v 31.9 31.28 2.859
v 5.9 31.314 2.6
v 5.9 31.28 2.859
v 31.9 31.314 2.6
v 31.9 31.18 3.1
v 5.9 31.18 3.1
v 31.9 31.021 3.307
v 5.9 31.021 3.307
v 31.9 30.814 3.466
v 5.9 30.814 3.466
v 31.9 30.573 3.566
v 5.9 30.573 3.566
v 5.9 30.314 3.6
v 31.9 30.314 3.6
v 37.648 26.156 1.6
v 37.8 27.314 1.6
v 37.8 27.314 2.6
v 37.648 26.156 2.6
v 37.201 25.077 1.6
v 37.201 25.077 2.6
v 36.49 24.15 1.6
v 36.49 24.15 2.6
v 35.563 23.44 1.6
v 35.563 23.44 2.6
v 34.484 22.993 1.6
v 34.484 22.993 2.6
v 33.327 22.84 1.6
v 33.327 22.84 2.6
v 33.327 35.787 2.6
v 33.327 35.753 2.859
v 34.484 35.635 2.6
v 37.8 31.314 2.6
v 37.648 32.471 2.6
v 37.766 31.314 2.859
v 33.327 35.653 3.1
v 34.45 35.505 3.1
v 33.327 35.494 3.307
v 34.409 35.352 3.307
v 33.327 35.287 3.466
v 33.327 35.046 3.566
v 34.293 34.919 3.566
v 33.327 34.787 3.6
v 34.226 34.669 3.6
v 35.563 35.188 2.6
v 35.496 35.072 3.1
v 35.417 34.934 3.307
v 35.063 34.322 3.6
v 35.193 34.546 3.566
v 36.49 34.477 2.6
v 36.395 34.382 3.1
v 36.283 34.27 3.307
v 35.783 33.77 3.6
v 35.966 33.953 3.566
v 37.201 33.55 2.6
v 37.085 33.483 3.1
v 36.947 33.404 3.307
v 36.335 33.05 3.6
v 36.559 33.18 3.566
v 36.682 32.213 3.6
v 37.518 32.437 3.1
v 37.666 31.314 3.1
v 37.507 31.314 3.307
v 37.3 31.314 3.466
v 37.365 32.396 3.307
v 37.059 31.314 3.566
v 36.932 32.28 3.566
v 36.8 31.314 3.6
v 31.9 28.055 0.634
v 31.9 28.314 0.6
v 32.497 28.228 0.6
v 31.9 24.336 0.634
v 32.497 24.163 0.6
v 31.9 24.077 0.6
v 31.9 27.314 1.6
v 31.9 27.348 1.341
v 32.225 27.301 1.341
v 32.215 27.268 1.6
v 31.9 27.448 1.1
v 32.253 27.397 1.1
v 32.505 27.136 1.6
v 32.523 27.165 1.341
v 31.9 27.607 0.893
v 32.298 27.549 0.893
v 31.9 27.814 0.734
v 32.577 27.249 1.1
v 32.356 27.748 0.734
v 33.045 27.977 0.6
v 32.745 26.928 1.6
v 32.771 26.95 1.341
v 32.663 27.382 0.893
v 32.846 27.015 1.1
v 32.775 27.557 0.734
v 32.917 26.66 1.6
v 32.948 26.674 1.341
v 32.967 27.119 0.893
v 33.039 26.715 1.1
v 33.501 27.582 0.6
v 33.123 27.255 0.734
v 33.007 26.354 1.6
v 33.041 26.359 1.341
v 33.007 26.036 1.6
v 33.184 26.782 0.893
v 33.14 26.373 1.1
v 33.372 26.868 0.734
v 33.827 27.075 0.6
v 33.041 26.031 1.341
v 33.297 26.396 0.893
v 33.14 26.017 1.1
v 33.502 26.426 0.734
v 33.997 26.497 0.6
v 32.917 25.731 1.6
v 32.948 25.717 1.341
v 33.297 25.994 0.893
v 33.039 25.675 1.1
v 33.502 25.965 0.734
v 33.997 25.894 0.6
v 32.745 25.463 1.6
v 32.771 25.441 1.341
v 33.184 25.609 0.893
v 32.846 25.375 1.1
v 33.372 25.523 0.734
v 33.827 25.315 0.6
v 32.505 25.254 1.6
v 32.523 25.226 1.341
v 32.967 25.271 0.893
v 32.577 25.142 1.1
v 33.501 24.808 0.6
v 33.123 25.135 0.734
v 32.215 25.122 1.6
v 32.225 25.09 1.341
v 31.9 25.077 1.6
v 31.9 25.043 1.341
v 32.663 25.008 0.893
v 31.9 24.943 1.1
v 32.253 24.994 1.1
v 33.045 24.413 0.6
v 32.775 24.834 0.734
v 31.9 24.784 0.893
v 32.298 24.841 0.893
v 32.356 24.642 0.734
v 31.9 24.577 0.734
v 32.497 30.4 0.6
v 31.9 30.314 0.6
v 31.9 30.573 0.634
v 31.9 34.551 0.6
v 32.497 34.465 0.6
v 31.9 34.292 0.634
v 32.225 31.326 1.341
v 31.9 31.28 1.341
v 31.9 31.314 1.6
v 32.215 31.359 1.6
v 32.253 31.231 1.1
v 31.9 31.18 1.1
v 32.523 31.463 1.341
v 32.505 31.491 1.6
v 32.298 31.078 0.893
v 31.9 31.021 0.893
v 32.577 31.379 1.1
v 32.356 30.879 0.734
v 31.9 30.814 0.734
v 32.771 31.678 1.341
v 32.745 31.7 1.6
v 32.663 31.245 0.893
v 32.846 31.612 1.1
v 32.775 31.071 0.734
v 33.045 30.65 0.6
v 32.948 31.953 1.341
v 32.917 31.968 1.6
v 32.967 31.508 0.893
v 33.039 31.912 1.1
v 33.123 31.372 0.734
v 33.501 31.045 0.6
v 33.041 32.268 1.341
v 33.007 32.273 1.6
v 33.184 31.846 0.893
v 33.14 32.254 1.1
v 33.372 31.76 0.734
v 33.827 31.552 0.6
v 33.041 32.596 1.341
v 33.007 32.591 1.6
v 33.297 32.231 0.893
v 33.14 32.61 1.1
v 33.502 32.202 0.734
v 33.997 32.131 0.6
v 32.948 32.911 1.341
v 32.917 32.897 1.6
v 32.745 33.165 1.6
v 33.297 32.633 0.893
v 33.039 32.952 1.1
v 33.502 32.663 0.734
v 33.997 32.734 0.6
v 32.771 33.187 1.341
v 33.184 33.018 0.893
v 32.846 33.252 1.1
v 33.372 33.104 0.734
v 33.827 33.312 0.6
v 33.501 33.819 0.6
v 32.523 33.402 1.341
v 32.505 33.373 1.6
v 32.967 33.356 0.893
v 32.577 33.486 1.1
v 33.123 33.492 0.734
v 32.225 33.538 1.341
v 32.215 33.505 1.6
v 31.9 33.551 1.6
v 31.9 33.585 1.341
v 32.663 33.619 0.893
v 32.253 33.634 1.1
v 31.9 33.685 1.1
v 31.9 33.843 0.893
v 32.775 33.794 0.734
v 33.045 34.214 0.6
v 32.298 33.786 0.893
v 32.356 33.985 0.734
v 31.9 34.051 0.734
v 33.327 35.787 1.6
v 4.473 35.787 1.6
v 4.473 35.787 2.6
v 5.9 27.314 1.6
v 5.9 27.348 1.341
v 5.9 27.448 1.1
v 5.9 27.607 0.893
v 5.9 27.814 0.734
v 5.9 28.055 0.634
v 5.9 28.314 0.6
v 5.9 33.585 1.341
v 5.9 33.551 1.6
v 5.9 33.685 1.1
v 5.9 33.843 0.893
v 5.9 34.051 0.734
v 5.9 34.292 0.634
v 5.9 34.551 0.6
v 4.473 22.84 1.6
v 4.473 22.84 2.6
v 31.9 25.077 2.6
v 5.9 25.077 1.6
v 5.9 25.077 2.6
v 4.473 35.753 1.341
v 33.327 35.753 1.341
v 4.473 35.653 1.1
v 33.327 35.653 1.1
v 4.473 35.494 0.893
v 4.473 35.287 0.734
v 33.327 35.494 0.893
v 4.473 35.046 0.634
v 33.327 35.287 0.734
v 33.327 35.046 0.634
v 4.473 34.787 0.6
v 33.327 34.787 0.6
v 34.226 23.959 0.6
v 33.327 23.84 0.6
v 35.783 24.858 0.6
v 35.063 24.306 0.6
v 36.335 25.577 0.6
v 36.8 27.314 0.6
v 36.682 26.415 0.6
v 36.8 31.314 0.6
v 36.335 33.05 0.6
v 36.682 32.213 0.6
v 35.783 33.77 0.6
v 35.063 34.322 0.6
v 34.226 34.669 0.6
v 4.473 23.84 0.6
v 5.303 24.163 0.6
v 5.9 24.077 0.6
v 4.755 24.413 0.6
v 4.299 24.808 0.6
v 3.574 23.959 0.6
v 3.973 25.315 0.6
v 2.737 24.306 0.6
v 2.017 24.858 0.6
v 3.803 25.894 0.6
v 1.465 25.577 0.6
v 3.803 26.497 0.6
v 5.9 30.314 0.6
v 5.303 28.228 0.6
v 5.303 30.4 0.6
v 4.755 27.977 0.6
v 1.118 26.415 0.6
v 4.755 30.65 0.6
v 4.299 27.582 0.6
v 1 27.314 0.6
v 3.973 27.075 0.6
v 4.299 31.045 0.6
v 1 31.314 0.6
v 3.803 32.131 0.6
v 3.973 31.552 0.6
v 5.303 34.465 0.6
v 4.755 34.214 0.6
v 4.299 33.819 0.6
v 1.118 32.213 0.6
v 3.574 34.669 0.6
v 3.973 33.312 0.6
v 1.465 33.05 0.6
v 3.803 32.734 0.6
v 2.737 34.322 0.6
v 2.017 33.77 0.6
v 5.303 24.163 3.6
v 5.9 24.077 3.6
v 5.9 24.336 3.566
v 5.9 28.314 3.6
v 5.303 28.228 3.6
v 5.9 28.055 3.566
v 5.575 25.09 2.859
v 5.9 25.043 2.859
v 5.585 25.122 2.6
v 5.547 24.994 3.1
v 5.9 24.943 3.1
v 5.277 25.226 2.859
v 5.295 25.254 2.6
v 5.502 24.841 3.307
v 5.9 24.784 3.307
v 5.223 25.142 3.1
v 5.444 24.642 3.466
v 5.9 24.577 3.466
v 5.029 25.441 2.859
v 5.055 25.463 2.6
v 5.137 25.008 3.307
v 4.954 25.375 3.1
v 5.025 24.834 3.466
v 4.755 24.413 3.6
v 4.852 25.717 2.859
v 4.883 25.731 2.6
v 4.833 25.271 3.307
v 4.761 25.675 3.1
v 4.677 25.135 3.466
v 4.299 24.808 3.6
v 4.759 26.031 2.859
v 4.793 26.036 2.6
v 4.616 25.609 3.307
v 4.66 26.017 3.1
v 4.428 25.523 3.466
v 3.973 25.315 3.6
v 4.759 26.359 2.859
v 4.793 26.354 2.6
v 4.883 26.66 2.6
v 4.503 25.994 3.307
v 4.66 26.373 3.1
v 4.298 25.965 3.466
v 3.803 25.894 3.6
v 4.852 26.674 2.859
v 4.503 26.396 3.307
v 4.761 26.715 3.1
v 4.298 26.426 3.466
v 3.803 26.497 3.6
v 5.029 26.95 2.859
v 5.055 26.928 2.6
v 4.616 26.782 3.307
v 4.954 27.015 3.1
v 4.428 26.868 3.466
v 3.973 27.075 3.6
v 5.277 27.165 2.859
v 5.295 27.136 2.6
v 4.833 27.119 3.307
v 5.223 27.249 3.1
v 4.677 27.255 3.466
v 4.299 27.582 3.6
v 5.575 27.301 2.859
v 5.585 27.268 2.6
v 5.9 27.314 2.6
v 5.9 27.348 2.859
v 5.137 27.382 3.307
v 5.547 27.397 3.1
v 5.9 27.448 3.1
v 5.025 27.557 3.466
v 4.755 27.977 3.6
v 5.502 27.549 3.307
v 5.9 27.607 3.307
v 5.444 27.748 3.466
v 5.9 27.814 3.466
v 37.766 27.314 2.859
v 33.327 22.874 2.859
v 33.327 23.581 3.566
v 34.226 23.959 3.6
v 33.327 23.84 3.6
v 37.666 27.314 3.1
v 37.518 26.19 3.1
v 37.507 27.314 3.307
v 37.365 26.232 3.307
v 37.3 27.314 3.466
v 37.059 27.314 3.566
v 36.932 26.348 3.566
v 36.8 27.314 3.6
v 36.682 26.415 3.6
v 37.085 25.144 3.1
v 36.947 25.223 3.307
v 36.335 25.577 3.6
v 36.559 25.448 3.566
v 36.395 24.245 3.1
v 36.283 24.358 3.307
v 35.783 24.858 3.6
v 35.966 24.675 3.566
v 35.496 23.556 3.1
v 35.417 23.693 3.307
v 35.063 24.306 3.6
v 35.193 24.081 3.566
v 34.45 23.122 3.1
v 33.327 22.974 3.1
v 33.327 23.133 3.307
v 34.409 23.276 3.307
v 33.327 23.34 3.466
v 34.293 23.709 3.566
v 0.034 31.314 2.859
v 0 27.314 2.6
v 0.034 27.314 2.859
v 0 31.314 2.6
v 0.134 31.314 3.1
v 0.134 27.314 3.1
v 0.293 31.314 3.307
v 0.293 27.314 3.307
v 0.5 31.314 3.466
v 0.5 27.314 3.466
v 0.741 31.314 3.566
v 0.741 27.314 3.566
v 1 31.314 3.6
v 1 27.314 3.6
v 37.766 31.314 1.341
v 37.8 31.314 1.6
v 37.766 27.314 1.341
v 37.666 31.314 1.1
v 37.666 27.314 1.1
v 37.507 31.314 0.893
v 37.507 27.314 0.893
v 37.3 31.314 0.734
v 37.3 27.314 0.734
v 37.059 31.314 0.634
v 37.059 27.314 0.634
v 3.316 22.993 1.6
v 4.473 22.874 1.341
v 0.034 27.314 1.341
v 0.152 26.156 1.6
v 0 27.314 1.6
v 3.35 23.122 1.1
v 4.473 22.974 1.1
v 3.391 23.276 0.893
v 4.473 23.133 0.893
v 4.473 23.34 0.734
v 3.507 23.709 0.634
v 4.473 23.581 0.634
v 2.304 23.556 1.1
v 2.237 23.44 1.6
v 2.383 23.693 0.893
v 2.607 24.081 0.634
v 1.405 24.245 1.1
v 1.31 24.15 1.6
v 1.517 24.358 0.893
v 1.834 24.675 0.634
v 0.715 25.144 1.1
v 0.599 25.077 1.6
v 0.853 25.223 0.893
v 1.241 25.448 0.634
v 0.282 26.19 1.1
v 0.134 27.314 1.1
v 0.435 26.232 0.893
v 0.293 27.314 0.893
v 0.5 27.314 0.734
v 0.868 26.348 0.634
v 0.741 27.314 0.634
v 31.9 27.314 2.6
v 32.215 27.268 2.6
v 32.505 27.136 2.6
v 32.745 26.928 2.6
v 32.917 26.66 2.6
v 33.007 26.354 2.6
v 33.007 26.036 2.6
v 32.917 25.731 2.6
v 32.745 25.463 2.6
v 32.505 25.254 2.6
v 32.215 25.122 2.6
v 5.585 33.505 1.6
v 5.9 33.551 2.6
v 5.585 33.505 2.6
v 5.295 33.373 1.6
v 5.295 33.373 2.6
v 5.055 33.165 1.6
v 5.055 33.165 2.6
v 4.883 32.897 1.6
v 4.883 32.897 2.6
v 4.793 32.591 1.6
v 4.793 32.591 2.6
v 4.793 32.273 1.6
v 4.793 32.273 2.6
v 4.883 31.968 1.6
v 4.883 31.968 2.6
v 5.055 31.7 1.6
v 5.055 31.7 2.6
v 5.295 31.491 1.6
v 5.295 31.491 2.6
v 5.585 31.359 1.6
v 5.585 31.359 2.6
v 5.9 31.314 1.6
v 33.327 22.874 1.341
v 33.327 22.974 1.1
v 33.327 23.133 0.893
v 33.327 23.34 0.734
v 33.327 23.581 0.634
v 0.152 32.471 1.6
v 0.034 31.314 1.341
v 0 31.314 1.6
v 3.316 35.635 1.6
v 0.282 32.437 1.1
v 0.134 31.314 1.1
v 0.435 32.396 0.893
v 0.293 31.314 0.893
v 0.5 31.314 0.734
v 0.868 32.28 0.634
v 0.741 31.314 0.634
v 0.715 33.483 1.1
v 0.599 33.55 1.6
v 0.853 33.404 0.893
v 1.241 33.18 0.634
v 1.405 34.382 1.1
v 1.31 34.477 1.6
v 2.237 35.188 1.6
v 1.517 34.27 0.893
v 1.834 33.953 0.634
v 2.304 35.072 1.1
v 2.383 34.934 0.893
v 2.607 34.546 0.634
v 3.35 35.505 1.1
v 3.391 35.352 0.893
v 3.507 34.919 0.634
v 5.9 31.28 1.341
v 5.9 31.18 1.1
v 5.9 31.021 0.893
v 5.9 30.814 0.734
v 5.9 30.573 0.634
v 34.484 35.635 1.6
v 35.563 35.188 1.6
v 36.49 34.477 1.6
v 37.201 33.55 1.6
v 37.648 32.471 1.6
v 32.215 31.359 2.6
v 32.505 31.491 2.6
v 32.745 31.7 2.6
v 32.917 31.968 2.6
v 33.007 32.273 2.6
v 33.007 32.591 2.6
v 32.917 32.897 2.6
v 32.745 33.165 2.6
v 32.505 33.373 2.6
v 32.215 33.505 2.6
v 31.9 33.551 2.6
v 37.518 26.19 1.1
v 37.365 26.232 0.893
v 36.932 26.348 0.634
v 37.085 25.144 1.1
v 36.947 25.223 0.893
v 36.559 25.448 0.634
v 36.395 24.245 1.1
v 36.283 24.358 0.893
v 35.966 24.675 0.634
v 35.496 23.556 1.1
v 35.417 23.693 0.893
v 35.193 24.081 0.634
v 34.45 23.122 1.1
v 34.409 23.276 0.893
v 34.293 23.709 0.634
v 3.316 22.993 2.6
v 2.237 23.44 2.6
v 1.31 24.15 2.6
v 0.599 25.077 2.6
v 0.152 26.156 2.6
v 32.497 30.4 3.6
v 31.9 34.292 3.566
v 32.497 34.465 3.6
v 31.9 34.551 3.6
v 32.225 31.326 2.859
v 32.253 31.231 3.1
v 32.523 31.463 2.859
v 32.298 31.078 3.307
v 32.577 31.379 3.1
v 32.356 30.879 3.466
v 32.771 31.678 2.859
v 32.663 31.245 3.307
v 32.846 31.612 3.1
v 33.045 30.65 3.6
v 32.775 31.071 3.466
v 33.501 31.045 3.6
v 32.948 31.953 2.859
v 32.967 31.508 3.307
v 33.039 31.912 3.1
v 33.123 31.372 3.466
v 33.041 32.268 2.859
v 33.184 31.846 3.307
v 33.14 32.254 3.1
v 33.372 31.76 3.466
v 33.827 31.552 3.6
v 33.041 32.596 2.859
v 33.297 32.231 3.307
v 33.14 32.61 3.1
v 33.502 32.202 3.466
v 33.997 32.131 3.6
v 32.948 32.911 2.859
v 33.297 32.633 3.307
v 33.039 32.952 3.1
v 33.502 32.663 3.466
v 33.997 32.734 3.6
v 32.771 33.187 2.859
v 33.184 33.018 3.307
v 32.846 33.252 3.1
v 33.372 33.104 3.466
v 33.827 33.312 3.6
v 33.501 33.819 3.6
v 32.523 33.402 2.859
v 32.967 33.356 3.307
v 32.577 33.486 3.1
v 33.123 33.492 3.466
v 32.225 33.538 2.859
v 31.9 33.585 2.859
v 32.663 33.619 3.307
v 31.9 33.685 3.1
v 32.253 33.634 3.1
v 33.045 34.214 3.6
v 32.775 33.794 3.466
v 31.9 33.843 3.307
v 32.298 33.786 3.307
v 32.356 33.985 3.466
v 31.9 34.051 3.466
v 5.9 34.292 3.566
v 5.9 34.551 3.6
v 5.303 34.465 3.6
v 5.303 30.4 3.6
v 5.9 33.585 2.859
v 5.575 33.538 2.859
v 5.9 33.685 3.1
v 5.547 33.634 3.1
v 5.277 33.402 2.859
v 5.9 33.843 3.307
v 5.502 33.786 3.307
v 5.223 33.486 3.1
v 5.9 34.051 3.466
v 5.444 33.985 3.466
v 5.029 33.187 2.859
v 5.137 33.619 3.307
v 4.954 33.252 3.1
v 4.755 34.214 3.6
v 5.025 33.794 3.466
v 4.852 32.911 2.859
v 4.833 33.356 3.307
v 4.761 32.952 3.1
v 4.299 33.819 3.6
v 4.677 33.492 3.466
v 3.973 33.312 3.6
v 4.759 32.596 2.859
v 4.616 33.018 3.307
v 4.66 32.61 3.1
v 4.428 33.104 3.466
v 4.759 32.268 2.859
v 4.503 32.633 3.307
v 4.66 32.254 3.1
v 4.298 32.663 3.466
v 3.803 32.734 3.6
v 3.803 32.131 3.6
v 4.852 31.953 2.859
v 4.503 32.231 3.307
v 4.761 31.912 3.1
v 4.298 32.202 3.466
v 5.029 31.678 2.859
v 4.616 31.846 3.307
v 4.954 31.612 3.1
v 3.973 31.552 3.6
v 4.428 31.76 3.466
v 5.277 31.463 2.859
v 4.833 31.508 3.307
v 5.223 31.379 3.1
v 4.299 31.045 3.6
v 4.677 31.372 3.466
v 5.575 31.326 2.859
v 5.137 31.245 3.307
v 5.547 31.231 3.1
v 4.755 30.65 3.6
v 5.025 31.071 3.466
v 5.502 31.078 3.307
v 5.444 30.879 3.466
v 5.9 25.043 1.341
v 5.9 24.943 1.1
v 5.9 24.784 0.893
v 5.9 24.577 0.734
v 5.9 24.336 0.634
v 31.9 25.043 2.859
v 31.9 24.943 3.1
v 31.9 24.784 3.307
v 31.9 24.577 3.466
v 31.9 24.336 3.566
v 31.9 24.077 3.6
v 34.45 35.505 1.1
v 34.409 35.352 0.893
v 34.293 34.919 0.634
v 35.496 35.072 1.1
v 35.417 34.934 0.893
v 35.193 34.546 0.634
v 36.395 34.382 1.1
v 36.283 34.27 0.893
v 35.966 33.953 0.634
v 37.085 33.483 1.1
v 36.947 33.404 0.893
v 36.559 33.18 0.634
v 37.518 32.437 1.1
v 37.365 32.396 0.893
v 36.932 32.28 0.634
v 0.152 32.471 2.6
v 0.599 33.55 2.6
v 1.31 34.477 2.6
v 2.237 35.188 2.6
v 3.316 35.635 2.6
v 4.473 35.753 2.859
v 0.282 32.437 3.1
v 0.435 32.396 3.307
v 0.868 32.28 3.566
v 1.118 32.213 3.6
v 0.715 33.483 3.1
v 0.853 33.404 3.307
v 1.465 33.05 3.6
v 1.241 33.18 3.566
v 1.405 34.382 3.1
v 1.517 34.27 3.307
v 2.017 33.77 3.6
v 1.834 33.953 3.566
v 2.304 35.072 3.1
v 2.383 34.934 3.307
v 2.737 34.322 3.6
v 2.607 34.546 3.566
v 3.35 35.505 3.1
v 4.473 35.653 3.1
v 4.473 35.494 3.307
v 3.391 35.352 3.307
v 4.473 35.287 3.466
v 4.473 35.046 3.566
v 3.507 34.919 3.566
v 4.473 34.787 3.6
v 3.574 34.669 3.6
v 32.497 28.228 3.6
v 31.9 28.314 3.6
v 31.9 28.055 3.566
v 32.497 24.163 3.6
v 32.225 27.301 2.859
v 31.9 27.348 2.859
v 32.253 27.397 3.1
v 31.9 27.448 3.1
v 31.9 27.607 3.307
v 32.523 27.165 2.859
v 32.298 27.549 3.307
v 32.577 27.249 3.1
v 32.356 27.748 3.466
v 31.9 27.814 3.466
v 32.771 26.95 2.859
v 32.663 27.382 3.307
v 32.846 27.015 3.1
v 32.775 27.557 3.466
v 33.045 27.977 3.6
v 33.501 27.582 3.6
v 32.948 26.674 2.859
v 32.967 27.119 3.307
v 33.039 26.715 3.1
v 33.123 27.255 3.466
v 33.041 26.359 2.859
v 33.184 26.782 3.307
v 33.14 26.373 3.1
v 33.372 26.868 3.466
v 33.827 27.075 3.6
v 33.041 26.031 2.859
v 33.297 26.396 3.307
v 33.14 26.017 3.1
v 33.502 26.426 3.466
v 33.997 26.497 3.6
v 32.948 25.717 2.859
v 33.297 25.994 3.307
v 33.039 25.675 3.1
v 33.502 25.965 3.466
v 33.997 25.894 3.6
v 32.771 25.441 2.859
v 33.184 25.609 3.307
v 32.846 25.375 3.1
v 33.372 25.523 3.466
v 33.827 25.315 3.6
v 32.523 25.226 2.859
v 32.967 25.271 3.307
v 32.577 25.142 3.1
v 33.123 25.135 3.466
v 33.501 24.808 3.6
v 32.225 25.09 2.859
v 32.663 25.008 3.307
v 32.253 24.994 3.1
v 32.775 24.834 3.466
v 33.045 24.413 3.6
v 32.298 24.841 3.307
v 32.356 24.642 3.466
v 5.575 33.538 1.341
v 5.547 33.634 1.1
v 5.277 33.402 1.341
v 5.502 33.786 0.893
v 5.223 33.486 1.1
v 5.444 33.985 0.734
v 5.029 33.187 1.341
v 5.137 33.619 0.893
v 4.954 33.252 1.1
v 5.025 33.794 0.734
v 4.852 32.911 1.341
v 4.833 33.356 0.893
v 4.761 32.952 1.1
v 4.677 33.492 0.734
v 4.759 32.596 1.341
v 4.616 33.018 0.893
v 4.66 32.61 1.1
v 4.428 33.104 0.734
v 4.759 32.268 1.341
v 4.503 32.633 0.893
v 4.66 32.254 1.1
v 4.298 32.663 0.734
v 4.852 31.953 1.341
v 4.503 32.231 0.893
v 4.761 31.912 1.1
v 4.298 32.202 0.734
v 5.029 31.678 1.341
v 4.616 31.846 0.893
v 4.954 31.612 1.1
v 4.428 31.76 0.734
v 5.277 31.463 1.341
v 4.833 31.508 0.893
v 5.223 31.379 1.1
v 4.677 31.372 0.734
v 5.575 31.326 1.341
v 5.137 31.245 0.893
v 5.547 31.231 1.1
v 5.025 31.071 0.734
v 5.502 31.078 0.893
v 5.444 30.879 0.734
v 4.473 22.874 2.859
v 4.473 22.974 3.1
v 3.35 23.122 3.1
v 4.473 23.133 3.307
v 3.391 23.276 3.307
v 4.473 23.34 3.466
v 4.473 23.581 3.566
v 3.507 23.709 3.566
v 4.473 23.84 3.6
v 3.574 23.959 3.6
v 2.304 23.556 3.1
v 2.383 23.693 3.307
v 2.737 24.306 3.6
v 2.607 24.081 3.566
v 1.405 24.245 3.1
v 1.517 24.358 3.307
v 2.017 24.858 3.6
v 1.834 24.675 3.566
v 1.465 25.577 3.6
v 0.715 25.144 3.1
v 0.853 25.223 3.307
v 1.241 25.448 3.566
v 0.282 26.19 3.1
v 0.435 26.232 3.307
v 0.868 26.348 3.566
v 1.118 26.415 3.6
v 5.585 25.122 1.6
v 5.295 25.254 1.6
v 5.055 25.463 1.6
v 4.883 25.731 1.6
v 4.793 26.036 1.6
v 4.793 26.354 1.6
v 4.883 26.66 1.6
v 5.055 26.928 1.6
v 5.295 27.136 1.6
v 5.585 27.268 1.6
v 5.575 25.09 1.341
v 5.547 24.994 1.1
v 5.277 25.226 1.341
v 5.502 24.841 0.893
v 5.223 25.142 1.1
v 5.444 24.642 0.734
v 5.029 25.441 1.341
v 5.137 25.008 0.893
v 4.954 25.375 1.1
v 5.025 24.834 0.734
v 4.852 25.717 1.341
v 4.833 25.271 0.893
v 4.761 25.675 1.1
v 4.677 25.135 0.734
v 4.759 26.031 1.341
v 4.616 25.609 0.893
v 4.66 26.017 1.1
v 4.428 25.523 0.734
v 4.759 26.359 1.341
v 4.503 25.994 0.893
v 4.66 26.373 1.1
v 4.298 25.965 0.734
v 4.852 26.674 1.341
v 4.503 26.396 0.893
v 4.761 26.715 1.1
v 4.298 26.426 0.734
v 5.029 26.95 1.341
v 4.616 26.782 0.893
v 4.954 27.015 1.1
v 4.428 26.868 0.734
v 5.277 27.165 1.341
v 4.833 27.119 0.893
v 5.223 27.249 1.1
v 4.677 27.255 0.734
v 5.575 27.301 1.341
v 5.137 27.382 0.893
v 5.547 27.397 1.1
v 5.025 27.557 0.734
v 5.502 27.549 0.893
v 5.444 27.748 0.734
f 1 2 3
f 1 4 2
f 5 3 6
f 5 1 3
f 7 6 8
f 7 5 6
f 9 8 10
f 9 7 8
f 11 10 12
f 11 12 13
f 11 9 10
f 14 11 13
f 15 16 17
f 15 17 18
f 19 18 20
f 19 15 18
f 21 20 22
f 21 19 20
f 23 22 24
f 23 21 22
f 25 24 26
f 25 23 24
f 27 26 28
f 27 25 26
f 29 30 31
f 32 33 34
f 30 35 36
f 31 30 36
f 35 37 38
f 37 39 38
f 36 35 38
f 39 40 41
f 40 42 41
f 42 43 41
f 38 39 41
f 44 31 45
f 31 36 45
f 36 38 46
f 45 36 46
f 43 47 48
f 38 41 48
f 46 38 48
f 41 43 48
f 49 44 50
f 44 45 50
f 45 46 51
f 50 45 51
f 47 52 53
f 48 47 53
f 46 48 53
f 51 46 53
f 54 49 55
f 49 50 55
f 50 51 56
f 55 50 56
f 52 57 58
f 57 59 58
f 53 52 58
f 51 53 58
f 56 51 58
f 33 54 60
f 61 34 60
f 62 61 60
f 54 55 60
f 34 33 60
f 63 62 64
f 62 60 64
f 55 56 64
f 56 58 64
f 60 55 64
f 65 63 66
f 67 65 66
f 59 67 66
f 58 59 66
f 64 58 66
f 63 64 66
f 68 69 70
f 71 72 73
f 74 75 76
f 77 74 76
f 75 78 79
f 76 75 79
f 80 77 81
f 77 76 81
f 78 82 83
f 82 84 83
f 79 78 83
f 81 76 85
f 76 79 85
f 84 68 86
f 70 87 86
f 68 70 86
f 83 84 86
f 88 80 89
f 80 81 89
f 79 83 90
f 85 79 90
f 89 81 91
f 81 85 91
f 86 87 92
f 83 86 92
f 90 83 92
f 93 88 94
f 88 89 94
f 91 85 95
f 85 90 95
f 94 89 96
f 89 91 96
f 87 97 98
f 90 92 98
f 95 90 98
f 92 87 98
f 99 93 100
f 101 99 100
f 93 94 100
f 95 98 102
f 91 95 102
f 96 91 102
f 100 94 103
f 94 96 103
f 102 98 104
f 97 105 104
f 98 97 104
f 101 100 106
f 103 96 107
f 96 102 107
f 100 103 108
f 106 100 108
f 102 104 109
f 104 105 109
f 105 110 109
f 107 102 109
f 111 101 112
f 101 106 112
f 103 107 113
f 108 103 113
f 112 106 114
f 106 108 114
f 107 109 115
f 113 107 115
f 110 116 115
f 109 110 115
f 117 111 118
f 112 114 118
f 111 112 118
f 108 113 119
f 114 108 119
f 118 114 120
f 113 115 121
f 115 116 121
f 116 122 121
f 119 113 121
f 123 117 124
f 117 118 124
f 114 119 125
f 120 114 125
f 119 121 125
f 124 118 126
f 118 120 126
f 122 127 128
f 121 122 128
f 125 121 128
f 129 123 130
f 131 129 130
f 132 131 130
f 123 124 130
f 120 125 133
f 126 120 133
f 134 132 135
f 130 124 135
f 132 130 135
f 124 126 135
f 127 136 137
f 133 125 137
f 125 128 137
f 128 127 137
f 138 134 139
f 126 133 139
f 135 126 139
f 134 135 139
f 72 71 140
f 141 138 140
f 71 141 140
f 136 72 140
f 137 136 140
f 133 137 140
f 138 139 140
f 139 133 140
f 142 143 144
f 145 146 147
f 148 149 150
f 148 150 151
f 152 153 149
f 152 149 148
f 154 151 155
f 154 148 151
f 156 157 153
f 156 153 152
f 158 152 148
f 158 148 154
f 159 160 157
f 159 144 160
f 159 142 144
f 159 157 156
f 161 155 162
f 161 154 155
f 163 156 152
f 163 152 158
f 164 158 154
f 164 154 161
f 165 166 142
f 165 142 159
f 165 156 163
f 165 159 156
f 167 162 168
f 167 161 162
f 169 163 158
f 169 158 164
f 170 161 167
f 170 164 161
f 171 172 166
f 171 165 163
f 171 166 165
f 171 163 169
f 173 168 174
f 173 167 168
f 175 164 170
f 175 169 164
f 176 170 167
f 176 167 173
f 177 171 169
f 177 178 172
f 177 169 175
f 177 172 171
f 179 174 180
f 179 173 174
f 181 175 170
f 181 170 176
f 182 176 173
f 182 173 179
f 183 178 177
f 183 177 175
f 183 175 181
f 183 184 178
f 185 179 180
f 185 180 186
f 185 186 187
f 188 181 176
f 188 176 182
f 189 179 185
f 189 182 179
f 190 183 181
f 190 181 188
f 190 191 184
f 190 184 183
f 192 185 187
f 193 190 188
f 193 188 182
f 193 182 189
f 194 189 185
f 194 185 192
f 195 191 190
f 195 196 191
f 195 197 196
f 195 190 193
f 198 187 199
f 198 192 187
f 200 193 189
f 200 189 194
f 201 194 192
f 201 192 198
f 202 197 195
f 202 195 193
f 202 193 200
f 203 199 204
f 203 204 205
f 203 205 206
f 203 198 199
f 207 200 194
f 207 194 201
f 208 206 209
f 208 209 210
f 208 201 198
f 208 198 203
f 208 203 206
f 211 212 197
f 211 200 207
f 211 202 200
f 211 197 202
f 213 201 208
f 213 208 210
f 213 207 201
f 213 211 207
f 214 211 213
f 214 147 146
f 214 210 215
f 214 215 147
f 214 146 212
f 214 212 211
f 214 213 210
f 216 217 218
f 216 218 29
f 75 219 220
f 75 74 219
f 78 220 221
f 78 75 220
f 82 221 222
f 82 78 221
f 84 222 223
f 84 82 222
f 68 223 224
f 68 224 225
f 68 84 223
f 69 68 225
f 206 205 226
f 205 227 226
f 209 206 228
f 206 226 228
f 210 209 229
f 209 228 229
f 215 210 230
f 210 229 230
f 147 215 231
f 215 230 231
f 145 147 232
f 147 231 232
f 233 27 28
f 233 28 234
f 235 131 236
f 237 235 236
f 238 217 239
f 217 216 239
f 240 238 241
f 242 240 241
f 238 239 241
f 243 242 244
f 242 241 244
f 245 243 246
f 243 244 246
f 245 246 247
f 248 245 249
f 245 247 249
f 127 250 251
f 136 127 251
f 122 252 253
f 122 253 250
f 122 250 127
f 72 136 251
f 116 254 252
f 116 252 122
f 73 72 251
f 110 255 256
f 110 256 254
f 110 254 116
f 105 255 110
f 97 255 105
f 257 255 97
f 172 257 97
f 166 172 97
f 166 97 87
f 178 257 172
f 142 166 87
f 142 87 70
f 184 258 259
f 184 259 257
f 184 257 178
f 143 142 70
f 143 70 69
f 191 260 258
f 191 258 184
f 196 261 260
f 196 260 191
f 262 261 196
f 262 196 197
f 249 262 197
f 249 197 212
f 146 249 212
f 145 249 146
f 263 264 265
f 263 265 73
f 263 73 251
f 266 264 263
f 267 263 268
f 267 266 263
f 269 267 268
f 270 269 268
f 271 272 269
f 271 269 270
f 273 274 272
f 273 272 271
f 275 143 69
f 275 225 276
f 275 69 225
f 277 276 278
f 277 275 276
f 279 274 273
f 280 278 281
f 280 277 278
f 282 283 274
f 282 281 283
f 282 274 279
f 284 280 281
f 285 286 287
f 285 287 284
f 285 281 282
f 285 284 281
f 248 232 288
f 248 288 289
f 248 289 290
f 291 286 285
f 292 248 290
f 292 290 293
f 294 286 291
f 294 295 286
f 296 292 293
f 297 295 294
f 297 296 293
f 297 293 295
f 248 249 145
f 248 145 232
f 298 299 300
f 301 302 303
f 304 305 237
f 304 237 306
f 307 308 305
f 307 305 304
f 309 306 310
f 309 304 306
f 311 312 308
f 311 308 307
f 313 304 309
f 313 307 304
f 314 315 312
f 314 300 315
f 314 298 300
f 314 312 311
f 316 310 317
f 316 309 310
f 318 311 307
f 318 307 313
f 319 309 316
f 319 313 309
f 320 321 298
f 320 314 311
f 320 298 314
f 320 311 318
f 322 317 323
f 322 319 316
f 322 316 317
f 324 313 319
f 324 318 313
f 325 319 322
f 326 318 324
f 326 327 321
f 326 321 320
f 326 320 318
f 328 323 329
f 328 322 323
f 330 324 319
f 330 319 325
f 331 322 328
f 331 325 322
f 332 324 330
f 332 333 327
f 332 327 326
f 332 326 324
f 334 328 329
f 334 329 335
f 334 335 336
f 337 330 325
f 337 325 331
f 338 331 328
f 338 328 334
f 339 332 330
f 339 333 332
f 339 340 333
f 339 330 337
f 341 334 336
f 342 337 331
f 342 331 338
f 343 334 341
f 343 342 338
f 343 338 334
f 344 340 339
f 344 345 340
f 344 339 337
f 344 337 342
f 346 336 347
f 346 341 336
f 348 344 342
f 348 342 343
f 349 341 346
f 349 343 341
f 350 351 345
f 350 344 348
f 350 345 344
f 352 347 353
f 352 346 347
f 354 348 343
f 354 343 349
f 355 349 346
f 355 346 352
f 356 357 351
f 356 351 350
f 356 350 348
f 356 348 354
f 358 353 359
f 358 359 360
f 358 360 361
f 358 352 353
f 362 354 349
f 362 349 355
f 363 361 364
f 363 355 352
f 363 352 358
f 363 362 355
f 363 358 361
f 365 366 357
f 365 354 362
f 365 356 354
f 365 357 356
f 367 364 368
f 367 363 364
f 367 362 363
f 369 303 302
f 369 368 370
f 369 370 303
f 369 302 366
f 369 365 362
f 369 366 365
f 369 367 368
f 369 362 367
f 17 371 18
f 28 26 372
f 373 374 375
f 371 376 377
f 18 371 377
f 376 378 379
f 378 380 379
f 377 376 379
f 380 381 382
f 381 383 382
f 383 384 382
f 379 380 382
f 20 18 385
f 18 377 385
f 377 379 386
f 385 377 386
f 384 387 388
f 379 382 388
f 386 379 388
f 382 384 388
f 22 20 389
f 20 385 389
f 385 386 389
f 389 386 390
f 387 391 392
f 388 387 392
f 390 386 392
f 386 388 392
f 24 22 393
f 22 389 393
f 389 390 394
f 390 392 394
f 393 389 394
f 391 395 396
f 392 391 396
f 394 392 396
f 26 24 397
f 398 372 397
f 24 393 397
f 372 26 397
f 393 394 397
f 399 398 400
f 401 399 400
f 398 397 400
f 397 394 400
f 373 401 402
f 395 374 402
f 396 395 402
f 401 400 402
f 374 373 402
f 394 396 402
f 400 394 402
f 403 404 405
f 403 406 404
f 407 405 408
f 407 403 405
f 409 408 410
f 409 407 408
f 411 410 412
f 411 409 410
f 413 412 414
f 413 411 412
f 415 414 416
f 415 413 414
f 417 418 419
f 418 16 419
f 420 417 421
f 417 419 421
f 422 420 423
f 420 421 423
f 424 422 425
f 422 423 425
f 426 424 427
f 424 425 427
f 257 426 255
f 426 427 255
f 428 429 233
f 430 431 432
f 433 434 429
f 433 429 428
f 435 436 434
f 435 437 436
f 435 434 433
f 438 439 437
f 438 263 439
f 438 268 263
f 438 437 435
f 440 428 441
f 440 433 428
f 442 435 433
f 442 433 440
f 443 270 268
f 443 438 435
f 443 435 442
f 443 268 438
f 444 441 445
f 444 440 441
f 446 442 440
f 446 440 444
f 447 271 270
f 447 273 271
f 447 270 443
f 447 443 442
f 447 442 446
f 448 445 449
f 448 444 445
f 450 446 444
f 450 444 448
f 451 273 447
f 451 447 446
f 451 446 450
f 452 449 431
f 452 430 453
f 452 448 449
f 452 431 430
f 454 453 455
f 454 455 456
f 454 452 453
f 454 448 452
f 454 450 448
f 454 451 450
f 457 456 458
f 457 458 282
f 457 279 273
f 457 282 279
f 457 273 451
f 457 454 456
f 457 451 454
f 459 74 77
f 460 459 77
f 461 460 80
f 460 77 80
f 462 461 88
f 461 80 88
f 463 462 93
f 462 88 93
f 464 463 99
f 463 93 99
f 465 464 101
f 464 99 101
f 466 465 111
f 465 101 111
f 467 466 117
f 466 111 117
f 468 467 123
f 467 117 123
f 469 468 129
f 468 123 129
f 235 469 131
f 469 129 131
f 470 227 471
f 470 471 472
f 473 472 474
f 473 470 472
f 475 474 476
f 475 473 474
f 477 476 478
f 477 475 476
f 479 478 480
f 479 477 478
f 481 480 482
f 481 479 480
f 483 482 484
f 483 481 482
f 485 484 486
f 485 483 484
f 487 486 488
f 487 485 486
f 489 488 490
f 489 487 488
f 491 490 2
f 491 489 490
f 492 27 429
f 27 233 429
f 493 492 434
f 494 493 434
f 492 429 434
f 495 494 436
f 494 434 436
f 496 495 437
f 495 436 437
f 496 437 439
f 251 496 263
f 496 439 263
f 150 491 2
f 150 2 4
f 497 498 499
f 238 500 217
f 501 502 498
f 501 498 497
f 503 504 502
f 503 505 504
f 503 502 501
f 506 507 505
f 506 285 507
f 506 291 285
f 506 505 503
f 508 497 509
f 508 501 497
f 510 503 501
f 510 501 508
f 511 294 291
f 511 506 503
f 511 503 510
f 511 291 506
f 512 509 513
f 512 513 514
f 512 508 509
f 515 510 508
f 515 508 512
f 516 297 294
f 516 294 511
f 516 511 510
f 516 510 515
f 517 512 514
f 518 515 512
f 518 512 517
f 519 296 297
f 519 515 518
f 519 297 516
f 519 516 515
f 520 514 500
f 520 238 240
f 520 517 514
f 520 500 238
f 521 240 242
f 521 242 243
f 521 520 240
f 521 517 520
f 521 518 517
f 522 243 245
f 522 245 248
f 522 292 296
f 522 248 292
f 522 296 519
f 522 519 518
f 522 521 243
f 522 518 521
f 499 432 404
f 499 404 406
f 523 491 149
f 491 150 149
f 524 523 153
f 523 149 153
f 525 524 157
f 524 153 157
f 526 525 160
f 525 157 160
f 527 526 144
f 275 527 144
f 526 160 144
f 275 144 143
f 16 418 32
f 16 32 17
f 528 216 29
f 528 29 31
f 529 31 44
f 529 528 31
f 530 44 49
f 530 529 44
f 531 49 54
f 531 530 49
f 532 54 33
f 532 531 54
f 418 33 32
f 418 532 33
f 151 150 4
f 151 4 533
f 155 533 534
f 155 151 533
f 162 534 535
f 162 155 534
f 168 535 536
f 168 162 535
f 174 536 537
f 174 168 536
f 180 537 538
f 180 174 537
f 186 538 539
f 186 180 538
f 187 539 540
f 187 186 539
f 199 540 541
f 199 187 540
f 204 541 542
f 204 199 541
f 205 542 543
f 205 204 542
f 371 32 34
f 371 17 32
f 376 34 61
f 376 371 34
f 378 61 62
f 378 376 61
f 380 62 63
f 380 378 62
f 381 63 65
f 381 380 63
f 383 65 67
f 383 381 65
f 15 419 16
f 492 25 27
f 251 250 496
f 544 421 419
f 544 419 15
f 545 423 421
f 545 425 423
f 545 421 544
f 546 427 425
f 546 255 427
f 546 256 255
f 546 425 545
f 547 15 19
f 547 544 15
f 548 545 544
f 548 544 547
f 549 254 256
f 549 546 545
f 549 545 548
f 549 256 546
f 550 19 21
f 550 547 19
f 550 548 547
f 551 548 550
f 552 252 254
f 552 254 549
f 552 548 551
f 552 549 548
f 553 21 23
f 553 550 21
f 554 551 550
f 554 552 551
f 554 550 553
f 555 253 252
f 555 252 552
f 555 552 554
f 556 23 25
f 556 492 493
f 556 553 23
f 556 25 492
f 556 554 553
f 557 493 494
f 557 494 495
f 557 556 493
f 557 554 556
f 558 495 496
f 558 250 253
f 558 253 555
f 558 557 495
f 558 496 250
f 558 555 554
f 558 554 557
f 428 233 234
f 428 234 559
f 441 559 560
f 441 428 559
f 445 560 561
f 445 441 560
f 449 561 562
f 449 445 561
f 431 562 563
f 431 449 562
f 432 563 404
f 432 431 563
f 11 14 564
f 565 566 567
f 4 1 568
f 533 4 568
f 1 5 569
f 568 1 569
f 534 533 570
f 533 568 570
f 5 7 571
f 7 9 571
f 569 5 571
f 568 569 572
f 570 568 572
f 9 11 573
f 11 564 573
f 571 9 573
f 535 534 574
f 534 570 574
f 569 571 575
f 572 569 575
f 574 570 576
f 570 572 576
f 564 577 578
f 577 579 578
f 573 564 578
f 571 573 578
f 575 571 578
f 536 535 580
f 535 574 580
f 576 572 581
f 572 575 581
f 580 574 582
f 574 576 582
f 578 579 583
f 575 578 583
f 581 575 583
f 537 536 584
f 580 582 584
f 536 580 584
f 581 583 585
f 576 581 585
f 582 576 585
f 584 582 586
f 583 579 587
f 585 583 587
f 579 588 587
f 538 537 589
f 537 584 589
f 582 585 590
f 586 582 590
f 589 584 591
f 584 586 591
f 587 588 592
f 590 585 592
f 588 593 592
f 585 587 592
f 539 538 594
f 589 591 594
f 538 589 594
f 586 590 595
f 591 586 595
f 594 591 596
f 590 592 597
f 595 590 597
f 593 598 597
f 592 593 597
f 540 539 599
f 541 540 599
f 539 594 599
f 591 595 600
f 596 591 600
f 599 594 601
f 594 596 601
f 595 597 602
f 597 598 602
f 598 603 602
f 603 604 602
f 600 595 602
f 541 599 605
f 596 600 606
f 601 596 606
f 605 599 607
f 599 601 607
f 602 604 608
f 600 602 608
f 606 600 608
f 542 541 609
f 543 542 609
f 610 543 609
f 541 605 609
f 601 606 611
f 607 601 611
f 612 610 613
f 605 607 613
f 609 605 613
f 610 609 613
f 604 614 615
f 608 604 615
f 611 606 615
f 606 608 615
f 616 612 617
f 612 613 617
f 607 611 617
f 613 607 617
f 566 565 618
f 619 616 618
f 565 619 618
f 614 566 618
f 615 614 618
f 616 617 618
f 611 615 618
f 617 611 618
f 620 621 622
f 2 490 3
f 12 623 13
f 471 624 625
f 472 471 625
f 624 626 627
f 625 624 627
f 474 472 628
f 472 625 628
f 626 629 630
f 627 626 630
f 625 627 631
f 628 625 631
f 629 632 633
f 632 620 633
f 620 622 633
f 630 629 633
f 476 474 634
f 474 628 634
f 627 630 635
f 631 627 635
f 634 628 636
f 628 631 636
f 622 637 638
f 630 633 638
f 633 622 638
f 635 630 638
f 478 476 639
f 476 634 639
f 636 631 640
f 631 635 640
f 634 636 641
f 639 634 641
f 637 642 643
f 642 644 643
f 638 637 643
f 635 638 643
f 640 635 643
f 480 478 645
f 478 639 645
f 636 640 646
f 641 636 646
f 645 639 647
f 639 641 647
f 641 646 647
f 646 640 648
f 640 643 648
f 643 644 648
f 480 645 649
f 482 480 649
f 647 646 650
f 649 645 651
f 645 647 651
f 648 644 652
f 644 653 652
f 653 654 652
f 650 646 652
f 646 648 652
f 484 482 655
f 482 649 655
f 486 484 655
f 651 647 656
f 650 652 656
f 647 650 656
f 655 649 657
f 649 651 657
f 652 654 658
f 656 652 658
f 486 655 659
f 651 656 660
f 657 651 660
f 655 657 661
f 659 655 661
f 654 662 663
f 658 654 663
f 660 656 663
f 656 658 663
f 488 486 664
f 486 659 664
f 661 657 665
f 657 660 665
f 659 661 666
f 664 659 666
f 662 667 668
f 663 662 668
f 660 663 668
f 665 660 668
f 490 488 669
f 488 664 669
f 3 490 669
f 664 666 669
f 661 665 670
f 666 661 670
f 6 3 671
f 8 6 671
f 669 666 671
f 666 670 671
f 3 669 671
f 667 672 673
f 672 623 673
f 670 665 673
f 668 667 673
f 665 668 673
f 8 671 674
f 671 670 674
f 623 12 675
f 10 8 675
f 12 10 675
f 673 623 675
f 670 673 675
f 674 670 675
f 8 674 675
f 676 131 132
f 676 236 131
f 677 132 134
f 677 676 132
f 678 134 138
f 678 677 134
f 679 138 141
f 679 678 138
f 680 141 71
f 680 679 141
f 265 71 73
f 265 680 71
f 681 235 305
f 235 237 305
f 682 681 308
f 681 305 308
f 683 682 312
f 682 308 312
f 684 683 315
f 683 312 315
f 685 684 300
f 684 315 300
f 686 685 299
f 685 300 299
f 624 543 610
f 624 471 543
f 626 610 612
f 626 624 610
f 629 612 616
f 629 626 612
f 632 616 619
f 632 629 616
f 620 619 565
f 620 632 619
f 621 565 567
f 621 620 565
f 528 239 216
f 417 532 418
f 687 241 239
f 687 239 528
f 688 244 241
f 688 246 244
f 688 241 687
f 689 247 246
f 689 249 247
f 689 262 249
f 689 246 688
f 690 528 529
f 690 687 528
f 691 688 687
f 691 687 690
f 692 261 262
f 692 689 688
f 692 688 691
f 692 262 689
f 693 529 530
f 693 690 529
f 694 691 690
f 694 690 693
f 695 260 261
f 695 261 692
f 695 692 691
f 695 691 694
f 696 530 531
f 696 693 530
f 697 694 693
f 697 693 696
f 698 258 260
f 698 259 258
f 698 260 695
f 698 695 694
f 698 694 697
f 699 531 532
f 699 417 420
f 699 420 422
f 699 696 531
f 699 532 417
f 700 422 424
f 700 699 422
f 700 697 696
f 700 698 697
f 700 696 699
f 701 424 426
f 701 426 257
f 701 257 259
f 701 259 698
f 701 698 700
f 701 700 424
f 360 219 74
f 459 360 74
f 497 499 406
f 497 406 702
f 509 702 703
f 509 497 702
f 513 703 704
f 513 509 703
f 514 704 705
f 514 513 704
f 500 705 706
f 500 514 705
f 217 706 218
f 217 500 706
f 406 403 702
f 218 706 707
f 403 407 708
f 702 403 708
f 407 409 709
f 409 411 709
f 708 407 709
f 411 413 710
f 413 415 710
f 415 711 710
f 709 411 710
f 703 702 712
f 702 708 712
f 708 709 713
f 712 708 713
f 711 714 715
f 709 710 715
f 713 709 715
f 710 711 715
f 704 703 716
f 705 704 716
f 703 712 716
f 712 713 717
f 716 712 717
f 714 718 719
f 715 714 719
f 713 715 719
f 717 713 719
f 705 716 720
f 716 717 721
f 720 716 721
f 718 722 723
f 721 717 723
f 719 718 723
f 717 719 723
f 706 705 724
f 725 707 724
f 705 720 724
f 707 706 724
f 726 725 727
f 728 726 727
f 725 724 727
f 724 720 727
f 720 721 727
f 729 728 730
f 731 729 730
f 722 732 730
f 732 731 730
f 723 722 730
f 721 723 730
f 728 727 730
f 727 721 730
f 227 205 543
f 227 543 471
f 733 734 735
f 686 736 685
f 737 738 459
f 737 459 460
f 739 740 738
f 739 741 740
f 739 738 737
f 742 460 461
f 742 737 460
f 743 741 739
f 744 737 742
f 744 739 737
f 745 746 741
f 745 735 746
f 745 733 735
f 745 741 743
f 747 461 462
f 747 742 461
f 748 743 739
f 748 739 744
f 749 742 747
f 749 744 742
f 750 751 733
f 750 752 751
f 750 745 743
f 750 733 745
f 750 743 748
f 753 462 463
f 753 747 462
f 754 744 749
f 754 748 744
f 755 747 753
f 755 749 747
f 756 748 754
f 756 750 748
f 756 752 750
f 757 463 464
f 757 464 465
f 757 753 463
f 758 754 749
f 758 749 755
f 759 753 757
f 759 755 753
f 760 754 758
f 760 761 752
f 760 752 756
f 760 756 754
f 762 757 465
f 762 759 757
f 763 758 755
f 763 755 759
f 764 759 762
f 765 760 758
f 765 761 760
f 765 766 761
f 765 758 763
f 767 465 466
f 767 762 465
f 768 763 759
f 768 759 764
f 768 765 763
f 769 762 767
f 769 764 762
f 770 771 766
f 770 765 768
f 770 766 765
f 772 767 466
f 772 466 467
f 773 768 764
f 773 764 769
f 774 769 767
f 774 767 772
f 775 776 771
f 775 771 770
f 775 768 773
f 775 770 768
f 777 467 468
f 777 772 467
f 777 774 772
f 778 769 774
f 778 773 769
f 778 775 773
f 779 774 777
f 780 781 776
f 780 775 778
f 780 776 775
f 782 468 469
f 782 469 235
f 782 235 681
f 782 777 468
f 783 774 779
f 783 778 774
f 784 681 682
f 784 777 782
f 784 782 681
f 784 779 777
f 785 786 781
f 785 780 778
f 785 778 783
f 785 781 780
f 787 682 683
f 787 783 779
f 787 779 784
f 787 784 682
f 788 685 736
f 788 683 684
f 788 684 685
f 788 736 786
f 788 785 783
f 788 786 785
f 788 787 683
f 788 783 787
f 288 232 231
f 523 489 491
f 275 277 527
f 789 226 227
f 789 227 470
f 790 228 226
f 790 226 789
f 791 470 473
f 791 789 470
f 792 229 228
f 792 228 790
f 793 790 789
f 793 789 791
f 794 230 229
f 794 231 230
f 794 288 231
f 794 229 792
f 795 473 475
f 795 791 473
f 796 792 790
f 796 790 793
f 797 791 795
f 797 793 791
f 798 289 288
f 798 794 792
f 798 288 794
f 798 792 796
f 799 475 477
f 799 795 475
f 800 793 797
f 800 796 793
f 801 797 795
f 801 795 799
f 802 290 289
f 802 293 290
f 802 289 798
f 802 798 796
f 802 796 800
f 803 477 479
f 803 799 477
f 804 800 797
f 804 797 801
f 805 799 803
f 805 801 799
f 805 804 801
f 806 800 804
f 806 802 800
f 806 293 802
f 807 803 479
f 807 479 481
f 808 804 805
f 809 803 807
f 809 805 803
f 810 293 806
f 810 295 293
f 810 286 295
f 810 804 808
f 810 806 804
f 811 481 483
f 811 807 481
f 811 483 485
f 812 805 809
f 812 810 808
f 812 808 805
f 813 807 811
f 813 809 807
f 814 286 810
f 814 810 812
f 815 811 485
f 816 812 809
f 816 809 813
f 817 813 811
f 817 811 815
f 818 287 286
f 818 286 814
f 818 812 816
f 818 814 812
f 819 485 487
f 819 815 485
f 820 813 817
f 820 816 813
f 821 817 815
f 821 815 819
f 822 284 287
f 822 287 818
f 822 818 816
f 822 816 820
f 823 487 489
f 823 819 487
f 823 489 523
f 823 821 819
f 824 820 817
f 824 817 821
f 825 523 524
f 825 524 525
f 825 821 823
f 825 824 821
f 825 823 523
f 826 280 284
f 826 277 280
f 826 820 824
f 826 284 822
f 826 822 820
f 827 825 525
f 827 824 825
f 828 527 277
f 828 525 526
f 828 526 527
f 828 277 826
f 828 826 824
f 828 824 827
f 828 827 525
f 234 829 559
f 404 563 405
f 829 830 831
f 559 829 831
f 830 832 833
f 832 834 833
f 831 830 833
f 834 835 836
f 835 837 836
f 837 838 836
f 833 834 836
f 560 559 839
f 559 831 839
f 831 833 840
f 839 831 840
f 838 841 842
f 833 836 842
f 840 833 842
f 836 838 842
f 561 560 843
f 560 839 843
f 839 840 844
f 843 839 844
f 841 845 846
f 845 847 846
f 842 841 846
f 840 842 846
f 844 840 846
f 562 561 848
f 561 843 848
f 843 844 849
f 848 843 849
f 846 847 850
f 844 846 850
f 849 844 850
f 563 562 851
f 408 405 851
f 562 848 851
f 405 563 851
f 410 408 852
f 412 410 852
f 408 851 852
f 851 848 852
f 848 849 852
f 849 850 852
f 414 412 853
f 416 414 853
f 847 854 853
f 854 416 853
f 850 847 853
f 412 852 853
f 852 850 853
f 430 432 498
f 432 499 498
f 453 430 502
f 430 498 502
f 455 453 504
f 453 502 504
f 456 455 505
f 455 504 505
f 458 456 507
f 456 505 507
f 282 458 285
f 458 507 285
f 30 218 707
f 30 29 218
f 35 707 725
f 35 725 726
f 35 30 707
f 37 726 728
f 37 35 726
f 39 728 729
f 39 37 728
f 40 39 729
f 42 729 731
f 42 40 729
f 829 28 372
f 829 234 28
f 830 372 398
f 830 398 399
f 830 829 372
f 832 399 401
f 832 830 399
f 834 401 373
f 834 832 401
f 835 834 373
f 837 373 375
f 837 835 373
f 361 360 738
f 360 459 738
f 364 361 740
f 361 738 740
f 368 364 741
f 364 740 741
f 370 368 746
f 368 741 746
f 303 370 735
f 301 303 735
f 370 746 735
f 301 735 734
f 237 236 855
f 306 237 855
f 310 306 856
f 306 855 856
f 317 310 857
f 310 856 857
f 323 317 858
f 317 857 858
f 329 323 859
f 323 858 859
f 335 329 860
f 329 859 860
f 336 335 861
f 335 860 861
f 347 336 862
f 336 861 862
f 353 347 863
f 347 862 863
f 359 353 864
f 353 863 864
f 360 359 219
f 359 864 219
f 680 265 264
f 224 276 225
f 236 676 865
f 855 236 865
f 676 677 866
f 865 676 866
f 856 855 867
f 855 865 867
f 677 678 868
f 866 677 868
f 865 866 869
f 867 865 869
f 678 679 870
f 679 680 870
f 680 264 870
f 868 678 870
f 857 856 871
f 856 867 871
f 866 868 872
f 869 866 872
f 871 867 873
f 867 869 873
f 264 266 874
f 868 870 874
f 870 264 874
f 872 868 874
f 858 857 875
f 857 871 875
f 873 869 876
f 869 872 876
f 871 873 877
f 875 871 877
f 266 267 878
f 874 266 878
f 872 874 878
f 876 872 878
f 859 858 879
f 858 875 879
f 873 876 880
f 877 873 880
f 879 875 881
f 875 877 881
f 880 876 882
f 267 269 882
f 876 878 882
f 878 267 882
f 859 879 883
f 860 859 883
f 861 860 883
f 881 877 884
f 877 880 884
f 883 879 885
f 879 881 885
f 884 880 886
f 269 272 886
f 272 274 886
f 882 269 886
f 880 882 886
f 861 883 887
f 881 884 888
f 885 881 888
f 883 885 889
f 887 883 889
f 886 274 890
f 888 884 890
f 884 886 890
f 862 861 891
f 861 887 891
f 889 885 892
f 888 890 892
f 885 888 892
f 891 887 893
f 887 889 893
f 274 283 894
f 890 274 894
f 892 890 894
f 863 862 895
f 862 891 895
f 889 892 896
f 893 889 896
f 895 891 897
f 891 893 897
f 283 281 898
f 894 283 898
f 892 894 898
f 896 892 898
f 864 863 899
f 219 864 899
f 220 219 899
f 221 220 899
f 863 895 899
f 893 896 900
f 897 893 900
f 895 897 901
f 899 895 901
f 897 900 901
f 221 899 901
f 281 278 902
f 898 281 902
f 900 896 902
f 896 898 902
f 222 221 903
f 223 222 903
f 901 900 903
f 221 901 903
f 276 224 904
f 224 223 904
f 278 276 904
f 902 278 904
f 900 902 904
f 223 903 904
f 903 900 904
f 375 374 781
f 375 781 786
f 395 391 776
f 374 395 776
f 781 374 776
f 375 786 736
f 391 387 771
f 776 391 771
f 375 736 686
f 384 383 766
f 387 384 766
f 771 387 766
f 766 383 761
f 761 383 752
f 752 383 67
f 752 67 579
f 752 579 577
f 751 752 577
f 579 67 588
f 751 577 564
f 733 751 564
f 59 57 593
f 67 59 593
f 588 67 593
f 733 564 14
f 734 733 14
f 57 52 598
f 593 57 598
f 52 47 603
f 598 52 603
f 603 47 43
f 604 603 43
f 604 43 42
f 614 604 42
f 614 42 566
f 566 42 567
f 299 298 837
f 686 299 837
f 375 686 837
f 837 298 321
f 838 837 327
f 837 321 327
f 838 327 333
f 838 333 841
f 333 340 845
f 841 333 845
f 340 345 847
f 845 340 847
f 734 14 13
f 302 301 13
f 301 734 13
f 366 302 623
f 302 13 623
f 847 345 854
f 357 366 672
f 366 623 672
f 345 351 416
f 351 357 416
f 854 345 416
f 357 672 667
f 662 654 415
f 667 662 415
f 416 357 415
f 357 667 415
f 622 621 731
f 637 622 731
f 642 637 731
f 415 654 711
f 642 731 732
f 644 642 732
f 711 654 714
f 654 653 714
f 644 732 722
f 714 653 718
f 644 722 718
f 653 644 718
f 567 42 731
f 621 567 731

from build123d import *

# Parameters (mm, degrees)
BOSS_EXTRUDE1_DEPTH = 3
FILLET1_R           = 1


with BuildPart() as part:
    # Sketch1 → Boss-Extrude1 (new body)
    with BuildSketch(Plane(origin=(0, 0, 0.6), x_dir=(-1, 0, 0), z_dir=(0, 0, -1))):
        with BuildLine():
            Line((-4.473372781, 35.786982249), (-33.326627219, 35.786982249))
            ThreePointArc((-33.326627219, 35.786982249), (-36.489779447, 34.476761696), (-37.8, 31.313609467))
            Line((-37.8, 31.313609467), (-37.8, 27.313609467))
            ThreePointArc((-37.8, 27.313609467), (-36.489779447, 24.150457239), (-33.326627219, 22.840236686))
            Line((-33.326627219, 22.840236686), (-4.473372781, 22.840236686))
            ThreePointArc((-4.473372781, 22.840236686), (-1.310220553, 24.150457239), (0, 27.313609467))
            Line((0, 27.313609467), (0, 31.313609467))
            ThreePointArc((0, 31.313609467), (-1.310220553, 34.476761696), (-4.473372781, 35.786982249))
        make_face()
        with BuildLine():
            Line((-5.9, 27.313609467), (-31.9, 27.313609467))
            ThreePointArc((-31.9, 27.313609467), (-33.018343195, 26.195266272), (-31.9, 25.076923077))
            Line((-31.9, 25.076923077), (-5.9, 25.076923077))
            ThreePointArc((-5.9, 25.076923077), (-4.781656805, 26.195266272), (-5.9, 27.313609467))
        make_face(mode=Mode.SUBTRACT)
        with BuildLine():
            Line((-5.9, 31.31385603), (-31.9, 31.31385603))
            ThreePointArc((-31.9, 31.31385603), (-33.018343195, 32.432199225), (-31.9, 33.550542421))
            Line((-31.9, 33.550542421), (-5.9, 33.550542421))
            ThreePointArc((-5.9, 33.550542421), (-4.781656805, 32.432199225), (-5.9, 31.31385603))
        make_face(mode=Mode.SUBTRACT)
    extrude(amount=-BOSS_EXTRUDE1_DEPTH)

    # Fillet1
    fillet1_edges = [part.edges().sort_by_distance(p)[0] for p in [
        (36.489779447, 34.476761696, 3.6),
        (18.9, 35.786982249, 0.6),
        (1.310220553, 34.476761696, 0.6),
        (37.8, 29.313609467, 3.6),
        (36.489779447, 24.150457239, 3.6),
        (18.9, 22.840236686, 3.6),
        (1.310220553, 24.150457239, 3.6),
        (4.781656805, 26.195266272, 3.6),
        (18.9, 25.076923077, 3.6),
        (33.018343195, 26.195266272, 3.6),
        (18.9, 27.313609467, 3.6),
        (0, 29.313609467, 3.6),
        (4.781656805, 26.195266272, 0.6),
        (18.9, 27.313609467, 0.6),
        (33.018343195, 26.195266272, 0.6),
        (18.9, 25.076923077, 0.6),
        (4.781656805, 32.432199225, 3.6),
        (18.9, 31.31385603, 3.6),
        (33.018343195, 32.432199225, 3.6),
        (18.9, 33.550542421, 3.6),
        (4.781656805, 32.432199225, 0.6),
        (18.9, 33.550542421, 0.6),
        (33.018343195, 32.432199225, 0.6),
        (18.9, 31.31385603, 0.6),
        (1.310220553, 34.476761696, 3.6),
        (18.9, 35.786982249, 3.6),
        (0, 29.313609467, 0.6),
        (1.310220553, 24.150457239, 0.6),
        (18.9, 22.840236686, 0.6),
        (36.489779447, 24.150457239, 0.6),
        (37.8, 29.313609467, 0.6),
        (36.489779447, 34.476761696, 0.6),
    ]]
    fillet(fillet1_edges, radius=FILLET1_R)


solid = part.part
